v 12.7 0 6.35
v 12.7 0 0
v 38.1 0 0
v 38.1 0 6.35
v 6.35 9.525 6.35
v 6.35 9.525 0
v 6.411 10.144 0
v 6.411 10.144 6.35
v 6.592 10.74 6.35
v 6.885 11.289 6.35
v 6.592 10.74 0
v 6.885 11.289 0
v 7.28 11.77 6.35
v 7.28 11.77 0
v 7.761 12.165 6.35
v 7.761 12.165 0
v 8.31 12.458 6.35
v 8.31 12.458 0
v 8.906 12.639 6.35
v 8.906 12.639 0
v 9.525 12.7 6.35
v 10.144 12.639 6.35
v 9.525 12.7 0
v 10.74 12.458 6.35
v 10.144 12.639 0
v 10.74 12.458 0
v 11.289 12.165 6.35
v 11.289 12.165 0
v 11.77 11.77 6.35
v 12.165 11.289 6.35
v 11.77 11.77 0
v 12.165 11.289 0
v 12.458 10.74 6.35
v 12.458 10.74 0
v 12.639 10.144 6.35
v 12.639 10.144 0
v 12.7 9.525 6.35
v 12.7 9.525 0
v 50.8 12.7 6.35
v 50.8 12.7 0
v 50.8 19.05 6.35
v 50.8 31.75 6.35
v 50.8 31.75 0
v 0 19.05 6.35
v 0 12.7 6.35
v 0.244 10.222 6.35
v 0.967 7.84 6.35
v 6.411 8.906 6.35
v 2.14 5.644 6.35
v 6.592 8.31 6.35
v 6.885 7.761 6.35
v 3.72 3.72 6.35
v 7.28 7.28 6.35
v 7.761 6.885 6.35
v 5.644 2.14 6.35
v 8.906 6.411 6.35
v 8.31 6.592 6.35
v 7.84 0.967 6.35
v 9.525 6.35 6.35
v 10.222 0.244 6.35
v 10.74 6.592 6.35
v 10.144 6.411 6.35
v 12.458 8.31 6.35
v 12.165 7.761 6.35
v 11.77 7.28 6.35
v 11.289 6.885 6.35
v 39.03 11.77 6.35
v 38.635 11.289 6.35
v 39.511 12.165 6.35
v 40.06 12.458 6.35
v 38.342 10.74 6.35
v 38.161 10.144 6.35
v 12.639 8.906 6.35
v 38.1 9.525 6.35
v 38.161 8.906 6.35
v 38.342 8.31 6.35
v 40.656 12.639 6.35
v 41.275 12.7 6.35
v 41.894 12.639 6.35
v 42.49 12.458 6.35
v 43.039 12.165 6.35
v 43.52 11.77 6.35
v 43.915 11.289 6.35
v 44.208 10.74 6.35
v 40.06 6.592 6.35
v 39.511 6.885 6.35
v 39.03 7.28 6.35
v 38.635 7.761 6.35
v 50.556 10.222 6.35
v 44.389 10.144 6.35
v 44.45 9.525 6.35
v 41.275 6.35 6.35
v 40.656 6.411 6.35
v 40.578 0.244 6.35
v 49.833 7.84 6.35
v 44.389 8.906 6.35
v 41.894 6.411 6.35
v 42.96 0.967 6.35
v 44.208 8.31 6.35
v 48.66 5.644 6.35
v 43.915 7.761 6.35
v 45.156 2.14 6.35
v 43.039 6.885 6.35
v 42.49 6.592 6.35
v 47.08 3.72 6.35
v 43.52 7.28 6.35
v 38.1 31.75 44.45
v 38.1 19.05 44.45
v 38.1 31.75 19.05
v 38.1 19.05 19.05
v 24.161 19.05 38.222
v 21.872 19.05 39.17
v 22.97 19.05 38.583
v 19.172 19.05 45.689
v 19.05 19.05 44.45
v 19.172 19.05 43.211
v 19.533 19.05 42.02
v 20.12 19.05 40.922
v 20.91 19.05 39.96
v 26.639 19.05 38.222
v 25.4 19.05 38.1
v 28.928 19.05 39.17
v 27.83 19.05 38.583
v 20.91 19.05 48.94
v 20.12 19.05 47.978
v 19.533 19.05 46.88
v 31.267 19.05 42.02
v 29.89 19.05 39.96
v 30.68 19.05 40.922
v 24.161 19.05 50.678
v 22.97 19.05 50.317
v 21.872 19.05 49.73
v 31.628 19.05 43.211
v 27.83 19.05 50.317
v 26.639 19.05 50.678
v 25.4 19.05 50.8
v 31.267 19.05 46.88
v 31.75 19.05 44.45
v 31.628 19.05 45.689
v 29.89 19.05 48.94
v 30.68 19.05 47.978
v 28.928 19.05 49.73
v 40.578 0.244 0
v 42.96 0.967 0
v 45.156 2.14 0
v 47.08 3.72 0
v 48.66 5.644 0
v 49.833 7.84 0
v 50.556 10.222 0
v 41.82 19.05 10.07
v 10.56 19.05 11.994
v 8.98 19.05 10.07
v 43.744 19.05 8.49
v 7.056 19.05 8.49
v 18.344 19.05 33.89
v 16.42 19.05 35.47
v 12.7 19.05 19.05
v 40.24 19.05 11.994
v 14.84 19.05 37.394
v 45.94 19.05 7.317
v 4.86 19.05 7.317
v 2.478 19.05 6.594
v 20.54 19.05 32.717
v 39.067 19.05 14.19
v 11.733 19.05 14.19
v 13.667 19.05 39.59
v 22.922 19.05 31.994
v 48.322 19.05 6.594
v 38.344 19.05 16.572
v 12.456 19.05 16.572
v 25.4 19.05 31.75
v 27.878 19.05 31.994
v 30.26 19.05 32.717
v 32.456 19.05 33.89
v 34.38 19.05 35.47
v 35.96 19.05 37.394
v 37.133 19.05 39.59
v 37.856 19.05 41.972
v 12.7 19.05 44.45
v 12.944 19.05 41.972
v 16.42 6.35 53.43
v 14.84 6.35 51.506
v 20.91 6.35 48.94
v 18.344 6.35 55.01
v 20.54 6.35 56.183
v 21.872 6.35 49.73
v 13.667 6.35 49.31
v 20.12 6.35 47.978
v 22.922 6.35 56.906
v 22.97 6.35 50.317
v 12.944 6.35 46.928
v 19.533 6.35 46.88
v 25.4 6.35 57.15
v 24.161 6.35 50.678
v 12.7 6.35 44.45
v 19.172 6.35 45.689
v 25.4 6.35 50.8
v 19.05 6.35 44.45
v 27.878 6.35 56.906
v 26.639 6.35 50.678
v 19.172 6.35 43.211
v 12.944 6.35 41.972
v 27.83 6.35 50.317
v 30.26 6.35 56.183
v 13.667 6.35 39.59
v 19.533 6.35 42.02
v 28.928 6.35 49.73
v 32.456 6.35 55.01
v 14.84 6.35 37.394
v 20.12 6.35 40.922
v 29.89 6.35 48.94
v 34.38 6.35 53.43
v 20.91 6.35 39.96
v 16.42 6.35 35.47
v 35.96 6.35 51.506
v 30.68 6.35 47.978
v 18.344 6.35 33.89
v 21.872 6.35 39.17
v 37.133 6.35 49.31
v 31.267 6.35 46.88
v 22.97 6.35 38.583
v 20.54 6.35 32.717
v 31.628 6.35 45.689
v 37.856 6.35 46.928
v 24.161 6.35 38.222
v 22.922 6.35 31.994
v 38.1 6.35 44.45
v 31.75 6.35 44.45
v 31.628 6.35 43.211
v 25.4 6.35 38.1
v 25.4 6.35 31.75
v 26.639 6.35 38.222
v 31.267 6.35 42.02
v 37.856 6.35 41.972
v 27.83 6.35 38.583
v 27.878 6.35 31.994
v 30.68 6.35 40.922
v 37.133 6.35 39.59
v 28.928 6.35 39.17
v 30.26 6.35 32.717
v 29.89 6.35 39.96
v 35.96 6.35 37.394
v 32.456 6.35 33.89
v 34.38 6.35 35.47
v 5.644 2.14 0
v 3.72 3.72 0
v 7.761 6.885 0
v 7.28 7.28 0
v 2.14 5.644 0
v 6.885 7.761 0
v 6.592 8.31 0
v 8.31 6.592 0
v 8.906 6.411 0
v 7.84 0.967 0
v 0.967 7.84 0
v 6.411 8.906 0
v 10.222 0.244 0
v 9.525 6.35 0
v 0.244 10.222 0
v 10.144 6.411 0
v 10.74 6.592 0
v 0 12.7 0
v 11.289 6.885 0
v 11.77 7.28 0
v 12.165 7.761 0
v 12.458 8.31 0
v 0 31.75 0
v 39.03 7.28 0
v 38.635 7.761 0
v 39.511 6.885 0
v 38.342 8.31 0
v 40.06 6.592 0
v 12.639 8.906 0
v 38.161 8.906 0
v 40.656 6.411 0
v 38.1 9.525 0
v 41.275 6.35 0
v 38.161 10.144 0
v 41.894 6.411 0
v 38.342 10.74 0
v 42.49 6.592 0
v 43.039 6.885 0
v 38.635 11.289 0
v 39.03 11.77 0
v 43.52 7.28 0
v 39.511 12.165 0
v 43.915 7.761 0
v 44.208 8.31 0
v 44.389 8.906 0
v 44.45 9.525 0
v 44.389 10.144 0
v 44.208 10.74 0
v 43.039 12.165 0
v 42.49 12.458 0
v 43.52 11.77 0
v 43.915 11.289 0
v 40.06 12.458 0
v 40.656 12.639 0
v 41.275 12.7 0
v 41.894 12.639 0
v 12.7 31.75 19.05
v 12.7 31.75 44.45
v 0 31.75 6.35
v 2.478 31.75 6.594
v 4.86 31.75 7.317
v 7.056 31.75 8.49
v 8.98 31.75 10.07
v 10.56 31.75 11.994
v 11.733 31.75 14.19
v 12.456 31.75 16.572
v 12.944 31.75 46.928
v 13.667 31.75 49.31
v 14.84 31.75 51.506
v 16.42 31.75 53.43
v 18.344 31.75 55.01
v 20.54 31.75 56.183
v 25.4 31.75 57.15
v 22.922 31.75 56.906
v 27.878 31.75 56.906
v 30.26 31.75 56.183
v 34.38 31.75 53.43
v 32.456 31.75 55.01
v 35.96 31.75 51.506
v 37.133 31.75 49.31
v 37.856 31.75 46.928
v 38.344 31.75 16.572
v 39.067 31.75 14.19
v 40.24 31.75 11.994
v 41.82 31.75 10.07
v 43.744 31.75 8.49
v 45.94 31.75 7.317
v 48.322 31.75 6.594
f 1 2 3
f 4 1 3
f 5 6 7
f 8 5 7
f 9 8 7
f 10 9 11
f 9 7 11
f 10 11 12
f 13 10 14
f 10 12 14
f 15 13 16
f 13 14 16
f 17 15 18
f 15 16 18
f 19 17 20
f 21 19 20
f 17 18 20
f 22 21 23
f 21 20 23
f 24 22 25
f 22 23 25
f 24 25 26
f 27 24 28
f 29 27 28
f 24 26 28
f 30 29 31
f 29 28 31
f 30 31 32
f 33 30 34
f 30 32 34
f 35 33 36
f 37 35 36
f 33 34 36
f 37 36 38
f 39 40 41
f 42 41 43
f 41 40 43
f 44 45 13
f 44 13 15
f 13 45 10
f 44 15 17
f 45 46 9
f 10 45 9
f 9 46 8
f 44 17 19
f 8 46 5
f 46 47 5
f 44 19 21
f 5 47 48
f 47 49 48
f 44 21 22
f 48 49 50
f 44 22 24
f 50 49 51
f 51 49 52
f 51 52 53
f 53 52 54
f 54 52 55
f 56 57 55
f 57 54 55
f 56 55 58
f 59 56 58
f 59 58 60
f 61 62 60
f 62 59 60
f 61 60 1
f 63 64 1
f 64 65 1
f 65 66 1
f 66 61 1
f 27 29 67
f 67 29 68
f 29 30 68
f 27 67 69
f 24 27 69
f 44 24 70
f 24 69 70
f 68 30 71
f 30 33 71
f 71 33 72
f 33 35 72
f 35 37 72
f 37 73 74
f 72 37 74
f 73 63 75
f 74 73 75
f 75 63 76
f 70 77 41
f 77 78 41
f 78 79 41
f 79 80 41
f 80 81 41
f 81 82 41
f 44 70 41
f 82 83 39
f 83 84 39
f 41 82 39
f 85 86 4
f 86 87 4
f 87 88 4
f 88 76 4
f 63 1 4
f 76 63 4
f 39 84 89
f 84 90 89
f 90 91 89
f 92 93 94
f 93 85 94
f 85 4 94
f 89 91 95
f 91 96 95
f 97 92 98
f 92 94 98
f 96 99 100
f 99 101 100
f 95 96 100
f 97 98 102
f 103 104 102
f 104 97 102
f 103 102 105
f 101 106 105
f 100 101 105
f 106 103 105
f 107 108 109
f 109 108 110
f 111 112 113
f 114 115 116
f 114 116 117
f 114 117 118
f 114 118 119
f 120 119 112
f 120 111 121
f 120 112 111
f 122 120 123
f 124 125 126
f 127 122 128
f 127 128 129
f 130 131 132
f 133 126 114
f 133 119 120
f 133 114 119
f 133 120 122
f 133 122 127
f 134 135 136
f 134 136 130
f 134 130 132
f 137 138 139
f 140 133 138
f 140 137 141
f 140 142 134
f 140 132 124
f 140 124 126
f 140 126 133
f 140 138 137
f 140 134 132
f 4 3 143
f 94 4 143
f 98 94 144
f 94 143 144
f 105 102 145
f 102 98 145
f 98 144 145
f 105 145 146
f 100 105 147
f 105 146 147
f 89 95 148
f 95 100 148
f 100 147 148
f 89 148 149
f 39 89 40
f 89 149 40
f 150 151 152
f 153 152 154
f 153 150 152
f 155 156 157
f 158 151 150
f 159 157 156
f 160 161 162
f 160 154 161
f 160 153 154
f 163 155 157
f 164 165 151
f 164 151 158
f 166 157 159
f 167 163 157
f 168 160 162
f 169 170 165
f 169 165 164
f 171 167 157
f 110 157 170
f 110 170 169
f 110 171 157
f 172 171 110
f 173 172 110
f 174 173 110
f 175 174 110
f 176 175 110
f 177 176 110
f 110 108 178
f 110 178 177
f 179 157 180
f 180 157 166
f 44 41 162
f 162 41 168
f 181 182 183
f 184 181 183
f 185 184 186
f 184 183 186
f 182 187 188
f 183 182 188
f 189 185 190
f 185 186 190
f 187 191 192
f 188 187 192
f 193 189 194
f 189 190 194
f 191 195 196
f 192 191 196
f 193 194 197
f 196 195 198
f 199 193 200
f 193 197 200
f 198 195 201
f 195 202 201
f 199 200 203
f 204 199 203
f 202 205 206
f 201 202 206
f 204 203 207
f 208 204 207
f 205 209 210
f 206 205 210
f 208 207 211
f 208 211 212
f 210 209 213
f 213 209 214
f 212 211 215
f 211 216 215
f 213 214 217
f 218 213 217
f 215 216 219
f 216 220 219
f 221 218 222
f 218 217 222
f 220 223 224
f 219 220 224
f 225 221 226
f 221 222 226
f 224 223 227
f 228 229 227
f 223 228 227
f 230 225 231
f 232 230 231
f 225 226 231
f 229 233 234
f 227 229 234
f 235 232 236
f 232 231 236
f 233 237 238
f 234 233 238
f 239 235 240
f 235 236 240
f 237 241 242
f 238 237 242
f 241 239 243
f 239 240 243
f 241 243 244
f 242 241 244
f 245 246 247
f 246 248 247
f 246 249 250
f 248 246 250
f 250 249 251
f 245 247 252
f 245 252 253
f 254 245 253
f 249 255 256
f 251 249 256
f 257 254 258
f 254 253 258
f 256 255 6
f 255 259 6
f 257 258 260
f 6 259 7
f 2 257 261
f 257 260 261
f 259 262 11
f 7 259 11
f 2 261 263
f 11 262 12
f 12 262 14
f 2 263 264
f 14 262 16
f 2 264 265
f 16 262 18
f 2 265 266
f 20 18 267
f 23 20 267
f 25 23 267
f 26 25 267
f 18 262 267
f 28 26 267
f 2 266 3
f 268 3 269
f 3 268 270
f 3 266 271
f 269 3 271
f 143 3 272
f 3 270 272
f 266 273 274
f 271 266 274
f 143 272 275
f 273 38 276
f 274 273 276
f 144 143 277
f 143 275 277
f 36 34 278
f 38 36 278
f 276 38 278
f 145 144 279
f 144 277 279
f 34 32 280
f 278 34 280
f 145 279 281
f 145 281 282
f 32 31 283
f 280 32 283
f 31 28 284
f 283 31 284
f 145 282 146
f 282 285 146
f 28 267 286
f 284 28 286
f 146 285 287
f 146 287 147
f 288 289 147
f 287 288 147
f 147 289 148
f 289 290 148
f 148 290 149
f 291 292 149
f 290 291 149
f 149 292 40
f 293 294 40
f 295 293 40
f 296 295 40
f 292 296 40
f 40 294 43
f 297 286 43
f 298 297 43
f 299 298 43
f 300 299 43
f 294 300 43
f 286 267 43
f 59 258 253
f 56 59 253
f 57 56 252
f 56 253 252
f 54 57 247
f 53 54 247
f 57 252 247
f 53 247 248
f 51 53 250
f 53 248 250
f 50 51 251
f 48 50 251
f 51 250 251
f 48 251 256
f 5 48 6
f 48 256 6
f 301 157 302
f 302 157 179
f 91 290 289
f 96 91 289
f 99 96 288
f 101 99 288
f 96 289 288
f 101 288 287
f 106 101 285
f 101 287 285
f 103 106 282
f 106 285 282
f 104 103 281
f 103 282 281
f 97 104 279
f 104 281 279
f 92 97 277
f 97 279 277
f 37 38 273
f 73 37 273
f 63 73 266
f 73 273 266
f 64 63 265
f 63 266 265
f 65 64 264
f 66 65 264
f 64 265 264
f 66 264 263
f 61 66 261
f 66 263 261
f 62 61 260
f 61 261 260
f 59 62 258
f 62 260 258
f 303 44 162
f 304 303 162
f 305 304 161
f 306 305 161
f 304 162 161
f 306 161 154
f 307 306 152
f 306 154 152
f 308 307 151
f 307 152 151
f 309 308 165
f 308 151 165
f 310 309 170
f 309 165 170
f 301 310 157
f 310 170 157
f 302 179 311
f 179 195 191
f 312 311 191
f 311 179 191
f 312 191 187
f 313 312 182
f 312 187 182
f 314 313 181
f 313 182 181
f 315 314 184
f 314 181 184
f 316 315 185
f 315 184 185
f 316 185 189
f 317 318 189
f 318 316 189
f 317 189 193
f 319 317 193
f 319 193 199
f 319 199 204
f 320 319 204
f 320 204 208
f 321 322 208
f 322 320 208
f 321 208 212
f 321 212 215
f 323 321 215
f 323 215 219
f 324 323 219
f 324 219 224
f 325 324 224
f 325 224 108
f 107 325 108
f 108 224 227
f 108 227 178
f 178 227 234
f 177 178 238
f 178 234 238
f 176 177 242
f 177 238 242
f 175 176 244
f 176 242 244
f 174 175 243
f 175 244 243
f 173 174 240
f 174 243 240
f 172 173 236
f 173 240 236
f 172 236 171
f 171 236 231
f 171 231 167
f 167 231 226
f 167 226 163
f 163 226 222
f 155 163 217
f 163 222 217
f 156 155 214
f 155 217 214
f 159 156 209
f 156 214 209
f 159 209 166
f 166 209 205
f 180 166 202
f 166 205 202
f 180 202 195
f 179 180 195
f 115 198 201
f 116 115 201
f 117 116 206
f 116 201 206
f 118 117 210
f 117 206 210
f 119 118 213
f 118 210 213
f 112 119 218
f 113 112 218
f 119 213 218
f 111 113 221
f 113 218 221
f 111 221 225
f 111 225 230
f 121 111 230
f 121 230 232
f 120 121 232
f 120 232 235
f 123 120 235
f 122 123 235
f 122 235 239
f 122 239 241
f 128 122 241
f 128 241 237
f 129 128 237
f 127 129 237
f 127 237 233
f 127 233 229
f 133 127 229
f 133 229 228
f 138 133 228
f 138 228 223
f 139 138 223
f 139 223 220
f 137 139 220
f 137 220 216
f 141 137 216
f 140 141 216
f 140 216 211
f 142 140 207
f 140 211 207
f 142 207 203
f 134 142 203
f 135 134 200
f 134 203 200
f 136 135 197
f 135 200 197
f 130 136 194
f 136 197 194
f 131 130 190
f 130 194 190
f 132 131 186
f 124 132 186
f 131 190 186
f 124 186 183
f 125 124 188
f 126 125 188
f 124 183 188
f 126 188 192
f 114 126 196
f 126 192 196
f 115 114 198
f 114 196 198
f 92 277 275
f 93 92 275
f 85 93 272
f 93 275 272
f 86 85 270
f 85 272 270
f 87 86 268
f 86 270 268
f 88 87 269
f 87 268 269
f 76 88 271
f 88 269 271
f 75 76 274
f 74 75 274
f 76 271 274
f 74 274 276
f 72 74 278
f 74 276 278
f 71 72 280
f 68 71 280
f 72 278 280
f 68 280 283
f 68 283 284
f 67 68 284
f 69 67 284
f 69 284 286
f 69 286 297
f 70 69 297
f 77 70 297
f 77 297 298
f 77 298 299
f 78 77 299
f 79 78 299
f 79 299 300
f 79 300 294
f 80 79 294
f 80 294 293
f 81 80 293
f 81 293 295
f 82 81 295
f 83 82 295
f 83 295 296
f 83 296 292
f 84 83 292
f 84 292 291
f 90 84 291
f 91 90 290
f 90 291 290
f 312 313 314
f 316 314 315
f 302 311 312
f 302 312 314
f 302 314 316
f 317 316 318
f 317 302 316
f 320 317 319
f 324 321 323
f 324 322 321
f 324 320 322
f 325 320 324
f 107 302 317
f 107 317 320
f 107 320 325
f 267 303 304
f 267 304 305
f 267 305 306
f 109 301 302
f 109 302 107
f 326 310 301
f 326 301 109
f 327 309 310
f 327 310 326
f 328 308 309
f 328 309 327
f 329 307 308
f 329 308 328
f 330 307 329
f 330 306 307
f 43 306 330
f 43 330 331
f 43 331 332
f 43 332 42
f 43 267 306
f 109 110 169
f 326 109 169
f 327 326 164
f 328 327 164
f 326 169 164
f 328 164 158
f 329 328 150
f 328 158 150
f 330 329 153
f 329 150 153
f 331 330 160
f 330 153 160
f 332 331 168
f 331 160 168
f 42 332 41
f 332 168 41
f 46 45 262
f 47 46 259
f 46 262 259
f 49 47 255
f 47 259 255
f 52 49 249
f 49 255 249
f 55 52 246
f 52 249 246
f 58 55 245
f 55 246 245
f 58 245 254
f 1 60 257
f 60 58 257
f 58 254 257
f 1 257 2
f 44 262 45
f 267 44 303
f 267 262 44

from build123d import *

# Parameters (mm, degrees)
F0_W      = 50.8
F0_H      = 31.75
F1_DEPTH  = 57.15
F2_W      = 50.8
F2_H      = 25.4
F3_DEPTH  = 19.05
F5_DEPTH  = 19.05
F6_DEPTH  = 6.35
F8_DEPTH  = 57.151
F10_DEPTH = 12.701
F12_DEPTH = 12.701
F14_DEPTH = 25.4


with BuildPart() as f1:
    # F0 (on Top) → F1 (new body)
    with BuildSketch(Plane.XY):
        with Locations((25.4, 15.875)):
            Rectangle(F0_W, F0_H)
    extrude(amount=F1_DEPTH)

    # F2 (on face) → F3 (cut)
    with BuildSketch(Plane.XZ):
        with Locations((25.4, 19.05)):
            Rectangle(F2_W, F2_H)
    extrude(amount=-F3_DEPTH, mode=Mode.SUBTRACT)

    # F4 (on face) → F5 (cut)
    with BuildSketch(Plane.XZ):
        with BuildLine():
            ThreePointArc((12.7, 44.45), (16.4197438789, 53.4302561211), (25.4, 57.15))
            Line((25.4, 57.15), (0, 57.15))
            Line((0, 57.15), (0, 44.45))
            Line((0, 44.45), (12.7, 44.45))
        make_face()
        with BuildLine():
            Line((0, 31.75), (25.4, 31.75))
            ThreePointArc((25.4, 31.75), (16.4197438789, 35.4697438789), (12.7, 44.45))
            Line((12.7, 44.45), (0, 44.45))
            Line((0, 44.45), (0, 31.75))
        make_face()
        with BuildLine():
            Line((50.8, 44.45), (38.1, 44.45))
            ThreePointArc((38.1, 44.45), (34.3802561211, 35.4697438789), (25.4, 31.75))
            Line((25.4, 31.75), (50.8, 31.75))
            Line((50.8, 31.75), (50.8, 44.45))
        make_face()
        with BuildLine():
            ThreePointArc((25.4, 57.15), (34.3802561211, 53.4302561211), (38.1, 44.45))
            Line((38.1, 44.45), (50.8, 44.45))
            Line((50.8, 44.45), (50.8, 57.15))
            Line((50.8, 57.15), (25.4, 57.15))
        make_face()
        with BuildLine():
            Line((19.05, 44.45), (31.75, 44.45))
            ThreePointArc((31.75, 44.45), (25.4, 50.8), (19.05, 44.45))
        make_face()
        with BuildLine():
            ThreePointArc((19.05, 44.45), (25.4, 38.1), (31.75, 44.45))
            Line((31.75, 44.45), (19.05, 44.45))
        make_face()
    extrude(amount=-F5_DEPTH, mode=Mode.SUBTRACT)

    # F6 (cut): a face of the model
    f6_faces = [f1.faces().sort_by_distance(p)[0] for p in [
        (25.4, 0, 56.7907897552),
    ]]
    extrude(f6_faces, amount=-F6_DEPTH, mode=Mode.SUBTRACT)

    # F7 (on face) → F8 (cut, through all)
    with BuildSketch(Plane(origin=(0, 0, 0), x_dir=(1, 0, 0), z_dir=(0, 0, -1))):
        with BuildLine():
            Line((0, 0), (0, -12.7))
            ThreePointArc((0, -12.7), (3.7197438789, -3.7197438789), (12.7, 0))
            Line((12.7, 0), (0, 0))
        make_face()
        with BuildLine():
            Line((50.8, 0), (38.1, 0))
            ThreePointArc((38.1, 0), (47.0802561211, -3.7197438789), (50.8, -12.7))
            Line((50.8, -12.7), (50.8, 0))
        make_face()
    extrude(amount=-F8_DEPTH, mode=Mode.SUBTRACT)

    # F9 (on face) → F10 (cut, through all)
    with BuildSketch(Plane.XZ.offset(-19.05)):
        Polygon((12.7, 44.45), (12.7, 57.15), (0, 57.15), (0, 19.05), (12.7, 19.05), align=None)
        Polygon((50.8, 57.15), (38.1, 57.15), (38.1, 44.45), (38.1, 19.05), (50.8, 19.05), align=None)
        with BuildLine():
            Line((38.1, 57.15), (25.4, 57.15))
            ThreePointArc((25.4, 57.15), (34.3802561211, 53.4302561211), (38.1, 44.45))
            Line((38.1, 44.45), (38.1, 57.15))
        make_face()
        with BuildLine():
            Line((25.4, 57.15), (12.7, 57.15))
            Line((12.7, 57.15), (12.7, 44.45))
            ThreePointArc((12.7, 44.45), (16.4197438789, 53.4302561211), (25.4, 57.15))
        make_face()
    extrude(amount=-F10_DEPTH, mode=Mode.SUBTRACT)

    # F11 (on face) → F12 (cut, through all)
    with BuildSketch(Plane.XZ.offset(-19.05)):
        with BuildLine():
            Line((0, 19.05), (0, 6.35))
            ThreePointArc((0, 6.35), (8.9802561211, 10.0697438789), (12.7, 19.05))
            Line((12.7, 19.05), (0, 19.05))
        make_face()
        with BuildLine():
            ThreePointArc((38.1, 19.05), (41.8197438789, 10.0697438789), (50.8, 6.35))
            Line((50.8, 6.35), (50.8, 19.05))
            Line((50.8, 19.05), (38.1, 19.05))
        make_face()
    extrude(amount=-F12_DEPTH, mode=Mode.SUBTRACT)

    # F13 (on face) → F14 (cut)
    with BuildSketch(Plane(origin=(0, 0, 0), x_dir=(1, 0, 0), z_dir=(0, 0, -1))):
        with BuildLine():
            Line((9.525, -9.525), (6.35, -9.525))
            ThreePointArc((6.35, -9.525), (9.525, -12.7), (12.7, -9.525))
            ThreePointArc((12.7, -9.525), (11.7700640303, -7.2799359697), (9.525, -6.35))
            Line((9.525, -6.35), (9.525, -9.525))
        make_face()
        with BuildLine():
            ThreePointArc((9.525, -6.35), (7.2799359697, -7.2799359697), (6.35, -9.525))
            Line((6.35, -9.525), (9.525, -9.525))
            Line((9.525, -9.525), (9.525, -6.35))
        make_face()
        with BuildLine():
            Line((41.275, -9.525), (41.275, -6.35))
            ThreePointArc((41.275, -6.35), (39.0299359697, -11.7700640303), (44.45, -9.525))
            Line((44.45, -9.525), (41.275, -9.525))
        make_face()
        with BuildLine():
            ThreePointArc((44.45, -9.525), (43.5200640303, -7.2799359697), (41.275, -6.35))
            Line((41.275, -6.35), (41.275, -9.525))
            Line((41.275, -9.525), (44.45, -9.525))
        make_face()
    extrude(amount=-F14_DEPTH, mode=Mode.SUBTRACT)


solid = f1.part
